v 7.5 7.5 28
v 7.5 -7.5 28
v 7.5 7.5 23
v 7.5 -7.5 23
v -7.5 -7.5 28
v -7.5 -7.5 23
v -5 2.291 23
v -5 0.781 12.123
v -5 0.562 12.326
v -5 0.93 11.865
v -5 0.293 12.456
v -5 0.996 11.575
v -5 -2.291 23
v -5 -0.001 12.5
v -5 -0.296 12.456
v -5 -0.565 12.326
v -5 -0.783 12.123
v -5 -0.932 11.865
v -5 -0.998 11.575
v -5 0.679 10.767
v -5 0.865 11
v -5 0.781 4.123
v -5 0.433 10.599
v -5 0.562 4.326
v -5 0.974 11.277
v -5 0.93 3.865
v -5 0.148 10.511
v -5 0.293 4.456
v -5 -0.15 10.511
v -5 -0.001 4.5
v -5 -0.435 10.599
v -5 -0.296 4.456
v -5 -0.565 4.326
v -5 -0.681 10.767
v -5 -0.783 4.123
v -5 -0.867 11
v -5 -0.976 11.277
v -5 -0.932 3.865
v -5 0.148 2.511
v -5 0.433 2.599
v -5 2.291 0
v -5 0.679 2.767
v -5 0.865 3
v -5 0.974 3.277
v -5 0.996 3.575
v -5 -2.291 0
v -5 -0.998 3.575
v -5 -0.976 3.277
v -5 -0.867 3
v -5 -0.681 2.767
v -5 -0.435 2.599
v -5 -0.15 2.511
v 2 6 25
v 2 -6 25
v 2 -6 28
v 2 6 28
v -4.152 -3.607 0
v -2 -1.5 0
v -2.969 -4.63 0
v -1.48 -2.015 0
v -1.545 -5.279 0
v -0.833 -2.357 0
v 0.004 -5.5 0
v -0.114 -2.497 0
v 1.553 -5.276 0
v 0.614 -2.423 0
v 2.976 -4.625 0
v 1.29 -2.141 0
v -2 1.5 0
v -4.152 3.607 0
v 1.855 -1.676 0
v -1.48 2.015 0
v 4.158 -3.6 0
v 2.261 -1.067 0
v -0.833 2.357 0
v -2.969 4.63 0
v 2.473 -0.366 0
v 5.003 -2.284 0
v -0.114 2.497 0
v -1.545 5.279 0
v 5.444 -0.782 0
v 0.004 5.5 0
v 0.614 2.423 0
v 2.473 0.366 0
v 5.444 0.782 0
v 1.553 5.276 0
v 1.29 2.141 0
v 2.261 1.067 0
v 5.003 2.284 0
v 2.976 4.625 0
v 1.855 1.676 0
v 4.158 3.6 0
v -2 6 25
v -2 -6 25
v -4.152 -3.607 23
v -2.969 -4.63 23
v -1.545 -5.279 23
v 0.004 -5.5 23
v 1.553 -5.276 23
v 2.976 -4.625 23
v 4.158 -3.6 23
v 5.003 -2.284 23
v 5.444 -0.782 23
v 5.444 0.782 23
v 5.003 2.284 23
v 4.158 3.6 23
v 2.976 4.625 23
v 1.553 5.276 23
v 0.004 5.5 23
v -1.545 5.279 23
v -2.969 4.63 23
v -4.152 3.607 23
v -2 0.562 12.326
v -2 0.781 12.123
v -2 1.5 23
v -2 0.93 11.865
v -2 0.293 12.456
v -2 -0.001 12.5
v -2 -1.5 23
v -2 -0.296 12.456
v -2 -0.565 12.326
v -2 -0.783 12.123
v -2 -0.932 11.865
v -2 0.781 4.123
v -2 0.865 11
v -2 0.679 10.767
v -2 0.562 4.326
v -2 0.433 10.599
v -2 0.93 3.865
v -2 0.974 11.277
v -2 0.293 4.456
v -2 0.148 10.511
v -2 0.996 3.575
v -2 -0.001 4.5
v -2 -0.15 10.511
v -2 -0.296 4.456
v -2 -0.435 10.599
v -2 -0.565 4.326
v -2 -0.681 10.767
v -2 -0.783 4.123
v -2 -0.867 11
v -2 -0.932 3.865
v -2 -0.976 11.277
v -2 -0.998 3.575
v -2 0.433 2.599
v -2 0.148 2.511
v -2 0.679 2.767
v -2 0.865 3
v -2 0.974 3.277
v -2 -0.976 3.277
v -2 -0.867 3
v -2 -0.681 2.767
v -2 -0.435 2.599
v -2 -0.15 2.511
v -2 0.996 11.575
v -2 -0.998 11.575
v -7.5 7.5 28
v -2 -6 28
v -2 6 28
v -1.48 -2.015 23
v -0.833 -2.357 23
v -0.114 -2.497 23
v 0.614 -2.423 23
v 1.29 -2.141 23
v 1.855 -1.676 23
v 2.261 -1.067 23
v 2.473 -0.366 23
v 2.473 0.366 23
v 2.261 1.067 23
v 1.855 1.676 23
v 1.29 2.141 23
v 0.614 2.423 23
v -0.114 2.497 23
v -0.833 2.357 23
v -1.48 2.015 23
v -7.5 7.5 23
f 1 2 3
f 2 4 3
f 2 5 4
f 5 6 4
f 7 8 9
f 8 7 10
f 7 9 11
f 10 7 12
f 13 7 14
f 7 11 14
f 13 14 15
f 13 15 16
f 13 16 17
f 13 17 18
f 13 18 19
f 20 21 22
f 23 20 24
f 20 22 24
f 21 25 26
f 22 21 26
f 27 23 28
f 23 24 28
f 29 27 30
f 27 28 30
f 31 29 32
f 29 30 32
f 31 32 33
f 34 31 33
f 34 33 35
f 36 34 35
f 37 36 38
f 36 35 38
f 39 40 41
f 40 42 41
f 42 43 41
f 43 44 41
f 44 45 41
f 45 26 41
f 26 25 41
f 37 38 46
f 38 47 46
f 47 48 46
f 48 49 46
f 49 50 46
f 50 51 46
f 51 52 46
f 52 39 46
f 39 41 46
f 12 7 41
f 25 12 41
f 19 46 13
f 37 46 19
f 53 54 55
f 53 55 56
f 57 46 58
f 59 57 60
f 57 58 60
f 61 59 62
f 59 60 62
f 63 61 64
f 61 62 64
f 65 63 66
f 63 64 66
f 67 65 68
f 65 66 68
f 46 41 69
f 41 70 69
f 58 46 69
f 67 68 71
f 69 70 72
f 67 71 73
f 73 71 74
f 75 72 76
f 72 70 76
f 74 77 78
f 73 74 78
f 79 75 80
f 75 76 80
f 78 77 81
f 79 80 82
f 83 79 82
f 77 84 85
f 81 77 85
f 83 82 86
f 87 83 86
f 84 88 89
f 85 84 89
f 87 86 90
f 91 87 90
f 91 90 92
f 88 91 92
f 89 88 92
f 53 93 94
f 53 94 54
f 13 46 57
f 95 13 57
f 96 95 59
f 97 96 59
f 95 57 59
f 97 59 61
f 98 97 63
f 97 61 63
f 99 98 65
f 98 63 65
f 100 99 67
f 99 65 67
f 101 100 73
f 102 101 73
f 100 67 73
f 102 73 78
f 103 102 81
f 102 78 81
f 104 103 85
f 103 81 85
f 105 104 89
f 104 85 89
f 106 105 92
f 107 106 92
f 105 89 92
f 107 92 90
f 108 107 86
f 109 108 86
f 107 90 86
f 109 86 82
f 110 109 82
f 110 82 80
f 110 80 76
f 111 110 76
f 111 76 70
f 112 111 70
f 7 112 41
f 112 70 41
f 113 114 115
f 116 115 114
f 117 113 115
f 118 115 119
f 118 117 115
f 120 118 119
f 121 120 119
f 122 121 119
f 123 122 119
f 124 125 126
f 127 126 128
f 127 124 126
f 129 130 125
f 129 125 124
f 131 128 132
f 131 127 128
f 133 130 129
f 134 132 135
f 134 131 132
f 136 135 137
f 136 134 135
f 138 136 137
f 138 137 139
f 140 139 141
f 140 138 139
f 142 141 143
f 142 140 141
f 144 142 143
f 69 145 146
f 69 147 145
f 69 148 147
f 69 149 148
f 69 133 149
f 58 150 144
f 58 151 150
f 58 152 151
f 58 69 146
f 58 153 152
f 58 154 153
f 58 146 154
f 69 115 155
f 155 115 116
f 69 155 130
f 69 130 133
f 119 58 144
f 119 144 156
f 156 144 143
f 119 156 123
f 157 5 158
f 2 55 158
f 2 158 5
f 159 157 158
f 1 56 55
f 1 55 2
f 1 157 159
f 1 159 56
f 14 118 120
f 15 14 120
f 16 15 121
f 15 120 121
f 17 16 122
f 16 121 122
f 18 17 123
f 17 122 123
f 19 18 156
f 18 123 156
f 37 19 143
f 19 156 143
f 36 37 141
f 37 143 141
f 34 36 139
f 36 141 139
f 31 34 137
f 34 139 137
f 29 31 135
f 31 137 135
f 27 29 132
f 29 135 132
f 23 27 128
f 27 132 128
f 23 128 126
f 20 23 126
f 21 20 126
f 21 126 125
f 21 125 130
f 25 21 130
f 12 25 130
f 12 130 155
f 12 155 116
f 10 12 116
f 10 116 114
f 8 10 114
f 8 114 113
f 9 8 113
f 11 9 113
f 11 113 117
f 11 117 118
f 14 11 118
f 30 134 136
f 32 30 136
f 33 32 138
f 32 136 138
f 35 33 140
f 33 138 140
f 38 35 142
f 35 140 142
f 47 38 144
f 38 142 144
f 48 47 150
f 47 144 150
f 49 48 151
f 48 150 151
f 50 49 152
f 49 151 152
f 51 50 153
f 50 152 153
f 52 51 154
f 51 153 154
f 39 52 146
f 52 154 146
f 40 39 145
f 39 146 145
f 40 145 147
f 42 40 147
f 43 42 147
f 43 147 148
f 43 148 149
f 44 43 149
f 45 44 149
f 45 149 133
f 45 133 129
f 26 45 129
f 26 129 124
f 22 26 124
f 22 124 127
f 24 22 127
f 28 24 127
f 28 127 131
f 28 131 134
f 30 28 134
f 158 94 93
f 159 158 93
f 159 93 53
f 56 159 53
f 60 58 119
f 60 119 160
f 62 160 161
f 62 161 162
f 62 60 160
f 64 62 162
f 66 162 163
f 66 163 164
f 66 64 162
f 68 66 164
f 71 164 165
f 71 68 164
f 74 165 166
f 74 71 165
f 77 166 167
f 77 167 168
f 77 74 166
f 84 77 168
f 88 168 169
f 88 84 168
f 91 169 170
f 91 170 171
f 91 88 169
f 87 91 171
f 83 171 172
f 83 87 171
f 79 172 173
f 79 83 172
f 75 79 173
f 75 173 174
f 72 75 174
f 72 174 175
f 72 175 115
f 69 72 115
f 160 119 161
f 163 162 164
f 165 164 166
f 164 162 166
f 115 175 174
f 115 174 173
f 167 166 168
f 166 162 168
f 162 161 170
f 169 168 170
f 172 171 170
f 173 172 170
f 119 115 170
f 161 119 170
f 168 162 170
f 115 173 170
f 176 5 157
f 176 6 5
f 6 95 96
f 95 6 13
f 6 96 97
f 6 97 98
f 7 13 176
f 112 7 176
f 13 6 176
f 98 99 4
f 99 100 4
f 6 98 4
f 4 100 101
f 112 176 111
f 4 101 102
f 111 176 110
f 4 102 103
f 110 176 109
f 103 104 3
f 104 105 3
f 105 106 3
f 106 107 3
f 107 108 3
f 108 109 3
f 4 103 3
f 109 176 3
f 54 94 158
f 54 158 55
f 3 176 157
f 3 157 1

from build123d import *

# Parameters (mm, degrees)
BOSS_EXTRU_1_DEPTH                = 23
DIAM_TRE_DU_PER_AGE_2_0_2_1_D     = 2
DIAM_TRE_DU_PER_AGE_2_0_2_1_DEPTH = 3
ESQUISSE4_W                       = 15
ESQUISSE4_H                       = 15
BOSS_EXTRU_3_DEPTH                = 2
ESQUISSE6_W                       = 15
ESQUISSE6_H                       = 15
ESQUISSE6_W_2                     = 4
ESQUISSE6_H_2                     = 12
BOSS_EXTRU_4_DEPTH                = 3


with BuildPart() as part:
    # Esquisse1 → Boss.-Extru.1 (new body)
    with BuildSketch(Plane.XY):
        with BuildLine():
            Line((-5, 2.291287847), (-5, -2.291287847))
            ThreePointArc((-5, -2.291287847), (5.5, 0), (-5, 2.291287847))
        make_face()
        with BuildLine():
            Line((-2, 1.5), (-2, -1.5))
            ThreePointArc((-2, -1.5), (2.5, 0), (-2, 1.5))
        make_face(mode=Mode.SUBTRACT)
    extrude(amount=BOSS_EXTRU_1_DEPTH)

    # Diamètre du perçage Ø2.0 (2)1
    with Locations(Plane(origin=(-5, -0.001287847, 3.5), x_dir=(0, 0, -1), z_dir=(-1, 0, 0))):
        with Locations((0, 0), (-8, 0)):
            Hole(DIAM_TRE_DU_PER_AGE_2_0_2_1_D / 2, depth=DIAM_TRE_DU_PER_AGE_2_0_2_1_DEPTH)

    # Esquisse4 → Boss.-Extru.3 (add)
    with BuildSketch(Plane.XY.offset(23)):
        Rectangle(ESQUISSE4_W, ESQUISSE4_H)
    extrude(amount=BOSS_EXTRU_3_DEPTH)

    # Esquisse6 → Boss.-Extru.4 (add)
    with BuildSketch(Plane.XY.offset(25)):
        Rectangle(ESQUISSE6_W, ESQUISSE6_H)
        Rectangle(ESQUISSE6_W_2, ESQUISSE6_H_2, mode=Mode.SUBTRACT)
    extrude(amount=BOSS_EXTRU_4_DEPTH)


solid = part.part
